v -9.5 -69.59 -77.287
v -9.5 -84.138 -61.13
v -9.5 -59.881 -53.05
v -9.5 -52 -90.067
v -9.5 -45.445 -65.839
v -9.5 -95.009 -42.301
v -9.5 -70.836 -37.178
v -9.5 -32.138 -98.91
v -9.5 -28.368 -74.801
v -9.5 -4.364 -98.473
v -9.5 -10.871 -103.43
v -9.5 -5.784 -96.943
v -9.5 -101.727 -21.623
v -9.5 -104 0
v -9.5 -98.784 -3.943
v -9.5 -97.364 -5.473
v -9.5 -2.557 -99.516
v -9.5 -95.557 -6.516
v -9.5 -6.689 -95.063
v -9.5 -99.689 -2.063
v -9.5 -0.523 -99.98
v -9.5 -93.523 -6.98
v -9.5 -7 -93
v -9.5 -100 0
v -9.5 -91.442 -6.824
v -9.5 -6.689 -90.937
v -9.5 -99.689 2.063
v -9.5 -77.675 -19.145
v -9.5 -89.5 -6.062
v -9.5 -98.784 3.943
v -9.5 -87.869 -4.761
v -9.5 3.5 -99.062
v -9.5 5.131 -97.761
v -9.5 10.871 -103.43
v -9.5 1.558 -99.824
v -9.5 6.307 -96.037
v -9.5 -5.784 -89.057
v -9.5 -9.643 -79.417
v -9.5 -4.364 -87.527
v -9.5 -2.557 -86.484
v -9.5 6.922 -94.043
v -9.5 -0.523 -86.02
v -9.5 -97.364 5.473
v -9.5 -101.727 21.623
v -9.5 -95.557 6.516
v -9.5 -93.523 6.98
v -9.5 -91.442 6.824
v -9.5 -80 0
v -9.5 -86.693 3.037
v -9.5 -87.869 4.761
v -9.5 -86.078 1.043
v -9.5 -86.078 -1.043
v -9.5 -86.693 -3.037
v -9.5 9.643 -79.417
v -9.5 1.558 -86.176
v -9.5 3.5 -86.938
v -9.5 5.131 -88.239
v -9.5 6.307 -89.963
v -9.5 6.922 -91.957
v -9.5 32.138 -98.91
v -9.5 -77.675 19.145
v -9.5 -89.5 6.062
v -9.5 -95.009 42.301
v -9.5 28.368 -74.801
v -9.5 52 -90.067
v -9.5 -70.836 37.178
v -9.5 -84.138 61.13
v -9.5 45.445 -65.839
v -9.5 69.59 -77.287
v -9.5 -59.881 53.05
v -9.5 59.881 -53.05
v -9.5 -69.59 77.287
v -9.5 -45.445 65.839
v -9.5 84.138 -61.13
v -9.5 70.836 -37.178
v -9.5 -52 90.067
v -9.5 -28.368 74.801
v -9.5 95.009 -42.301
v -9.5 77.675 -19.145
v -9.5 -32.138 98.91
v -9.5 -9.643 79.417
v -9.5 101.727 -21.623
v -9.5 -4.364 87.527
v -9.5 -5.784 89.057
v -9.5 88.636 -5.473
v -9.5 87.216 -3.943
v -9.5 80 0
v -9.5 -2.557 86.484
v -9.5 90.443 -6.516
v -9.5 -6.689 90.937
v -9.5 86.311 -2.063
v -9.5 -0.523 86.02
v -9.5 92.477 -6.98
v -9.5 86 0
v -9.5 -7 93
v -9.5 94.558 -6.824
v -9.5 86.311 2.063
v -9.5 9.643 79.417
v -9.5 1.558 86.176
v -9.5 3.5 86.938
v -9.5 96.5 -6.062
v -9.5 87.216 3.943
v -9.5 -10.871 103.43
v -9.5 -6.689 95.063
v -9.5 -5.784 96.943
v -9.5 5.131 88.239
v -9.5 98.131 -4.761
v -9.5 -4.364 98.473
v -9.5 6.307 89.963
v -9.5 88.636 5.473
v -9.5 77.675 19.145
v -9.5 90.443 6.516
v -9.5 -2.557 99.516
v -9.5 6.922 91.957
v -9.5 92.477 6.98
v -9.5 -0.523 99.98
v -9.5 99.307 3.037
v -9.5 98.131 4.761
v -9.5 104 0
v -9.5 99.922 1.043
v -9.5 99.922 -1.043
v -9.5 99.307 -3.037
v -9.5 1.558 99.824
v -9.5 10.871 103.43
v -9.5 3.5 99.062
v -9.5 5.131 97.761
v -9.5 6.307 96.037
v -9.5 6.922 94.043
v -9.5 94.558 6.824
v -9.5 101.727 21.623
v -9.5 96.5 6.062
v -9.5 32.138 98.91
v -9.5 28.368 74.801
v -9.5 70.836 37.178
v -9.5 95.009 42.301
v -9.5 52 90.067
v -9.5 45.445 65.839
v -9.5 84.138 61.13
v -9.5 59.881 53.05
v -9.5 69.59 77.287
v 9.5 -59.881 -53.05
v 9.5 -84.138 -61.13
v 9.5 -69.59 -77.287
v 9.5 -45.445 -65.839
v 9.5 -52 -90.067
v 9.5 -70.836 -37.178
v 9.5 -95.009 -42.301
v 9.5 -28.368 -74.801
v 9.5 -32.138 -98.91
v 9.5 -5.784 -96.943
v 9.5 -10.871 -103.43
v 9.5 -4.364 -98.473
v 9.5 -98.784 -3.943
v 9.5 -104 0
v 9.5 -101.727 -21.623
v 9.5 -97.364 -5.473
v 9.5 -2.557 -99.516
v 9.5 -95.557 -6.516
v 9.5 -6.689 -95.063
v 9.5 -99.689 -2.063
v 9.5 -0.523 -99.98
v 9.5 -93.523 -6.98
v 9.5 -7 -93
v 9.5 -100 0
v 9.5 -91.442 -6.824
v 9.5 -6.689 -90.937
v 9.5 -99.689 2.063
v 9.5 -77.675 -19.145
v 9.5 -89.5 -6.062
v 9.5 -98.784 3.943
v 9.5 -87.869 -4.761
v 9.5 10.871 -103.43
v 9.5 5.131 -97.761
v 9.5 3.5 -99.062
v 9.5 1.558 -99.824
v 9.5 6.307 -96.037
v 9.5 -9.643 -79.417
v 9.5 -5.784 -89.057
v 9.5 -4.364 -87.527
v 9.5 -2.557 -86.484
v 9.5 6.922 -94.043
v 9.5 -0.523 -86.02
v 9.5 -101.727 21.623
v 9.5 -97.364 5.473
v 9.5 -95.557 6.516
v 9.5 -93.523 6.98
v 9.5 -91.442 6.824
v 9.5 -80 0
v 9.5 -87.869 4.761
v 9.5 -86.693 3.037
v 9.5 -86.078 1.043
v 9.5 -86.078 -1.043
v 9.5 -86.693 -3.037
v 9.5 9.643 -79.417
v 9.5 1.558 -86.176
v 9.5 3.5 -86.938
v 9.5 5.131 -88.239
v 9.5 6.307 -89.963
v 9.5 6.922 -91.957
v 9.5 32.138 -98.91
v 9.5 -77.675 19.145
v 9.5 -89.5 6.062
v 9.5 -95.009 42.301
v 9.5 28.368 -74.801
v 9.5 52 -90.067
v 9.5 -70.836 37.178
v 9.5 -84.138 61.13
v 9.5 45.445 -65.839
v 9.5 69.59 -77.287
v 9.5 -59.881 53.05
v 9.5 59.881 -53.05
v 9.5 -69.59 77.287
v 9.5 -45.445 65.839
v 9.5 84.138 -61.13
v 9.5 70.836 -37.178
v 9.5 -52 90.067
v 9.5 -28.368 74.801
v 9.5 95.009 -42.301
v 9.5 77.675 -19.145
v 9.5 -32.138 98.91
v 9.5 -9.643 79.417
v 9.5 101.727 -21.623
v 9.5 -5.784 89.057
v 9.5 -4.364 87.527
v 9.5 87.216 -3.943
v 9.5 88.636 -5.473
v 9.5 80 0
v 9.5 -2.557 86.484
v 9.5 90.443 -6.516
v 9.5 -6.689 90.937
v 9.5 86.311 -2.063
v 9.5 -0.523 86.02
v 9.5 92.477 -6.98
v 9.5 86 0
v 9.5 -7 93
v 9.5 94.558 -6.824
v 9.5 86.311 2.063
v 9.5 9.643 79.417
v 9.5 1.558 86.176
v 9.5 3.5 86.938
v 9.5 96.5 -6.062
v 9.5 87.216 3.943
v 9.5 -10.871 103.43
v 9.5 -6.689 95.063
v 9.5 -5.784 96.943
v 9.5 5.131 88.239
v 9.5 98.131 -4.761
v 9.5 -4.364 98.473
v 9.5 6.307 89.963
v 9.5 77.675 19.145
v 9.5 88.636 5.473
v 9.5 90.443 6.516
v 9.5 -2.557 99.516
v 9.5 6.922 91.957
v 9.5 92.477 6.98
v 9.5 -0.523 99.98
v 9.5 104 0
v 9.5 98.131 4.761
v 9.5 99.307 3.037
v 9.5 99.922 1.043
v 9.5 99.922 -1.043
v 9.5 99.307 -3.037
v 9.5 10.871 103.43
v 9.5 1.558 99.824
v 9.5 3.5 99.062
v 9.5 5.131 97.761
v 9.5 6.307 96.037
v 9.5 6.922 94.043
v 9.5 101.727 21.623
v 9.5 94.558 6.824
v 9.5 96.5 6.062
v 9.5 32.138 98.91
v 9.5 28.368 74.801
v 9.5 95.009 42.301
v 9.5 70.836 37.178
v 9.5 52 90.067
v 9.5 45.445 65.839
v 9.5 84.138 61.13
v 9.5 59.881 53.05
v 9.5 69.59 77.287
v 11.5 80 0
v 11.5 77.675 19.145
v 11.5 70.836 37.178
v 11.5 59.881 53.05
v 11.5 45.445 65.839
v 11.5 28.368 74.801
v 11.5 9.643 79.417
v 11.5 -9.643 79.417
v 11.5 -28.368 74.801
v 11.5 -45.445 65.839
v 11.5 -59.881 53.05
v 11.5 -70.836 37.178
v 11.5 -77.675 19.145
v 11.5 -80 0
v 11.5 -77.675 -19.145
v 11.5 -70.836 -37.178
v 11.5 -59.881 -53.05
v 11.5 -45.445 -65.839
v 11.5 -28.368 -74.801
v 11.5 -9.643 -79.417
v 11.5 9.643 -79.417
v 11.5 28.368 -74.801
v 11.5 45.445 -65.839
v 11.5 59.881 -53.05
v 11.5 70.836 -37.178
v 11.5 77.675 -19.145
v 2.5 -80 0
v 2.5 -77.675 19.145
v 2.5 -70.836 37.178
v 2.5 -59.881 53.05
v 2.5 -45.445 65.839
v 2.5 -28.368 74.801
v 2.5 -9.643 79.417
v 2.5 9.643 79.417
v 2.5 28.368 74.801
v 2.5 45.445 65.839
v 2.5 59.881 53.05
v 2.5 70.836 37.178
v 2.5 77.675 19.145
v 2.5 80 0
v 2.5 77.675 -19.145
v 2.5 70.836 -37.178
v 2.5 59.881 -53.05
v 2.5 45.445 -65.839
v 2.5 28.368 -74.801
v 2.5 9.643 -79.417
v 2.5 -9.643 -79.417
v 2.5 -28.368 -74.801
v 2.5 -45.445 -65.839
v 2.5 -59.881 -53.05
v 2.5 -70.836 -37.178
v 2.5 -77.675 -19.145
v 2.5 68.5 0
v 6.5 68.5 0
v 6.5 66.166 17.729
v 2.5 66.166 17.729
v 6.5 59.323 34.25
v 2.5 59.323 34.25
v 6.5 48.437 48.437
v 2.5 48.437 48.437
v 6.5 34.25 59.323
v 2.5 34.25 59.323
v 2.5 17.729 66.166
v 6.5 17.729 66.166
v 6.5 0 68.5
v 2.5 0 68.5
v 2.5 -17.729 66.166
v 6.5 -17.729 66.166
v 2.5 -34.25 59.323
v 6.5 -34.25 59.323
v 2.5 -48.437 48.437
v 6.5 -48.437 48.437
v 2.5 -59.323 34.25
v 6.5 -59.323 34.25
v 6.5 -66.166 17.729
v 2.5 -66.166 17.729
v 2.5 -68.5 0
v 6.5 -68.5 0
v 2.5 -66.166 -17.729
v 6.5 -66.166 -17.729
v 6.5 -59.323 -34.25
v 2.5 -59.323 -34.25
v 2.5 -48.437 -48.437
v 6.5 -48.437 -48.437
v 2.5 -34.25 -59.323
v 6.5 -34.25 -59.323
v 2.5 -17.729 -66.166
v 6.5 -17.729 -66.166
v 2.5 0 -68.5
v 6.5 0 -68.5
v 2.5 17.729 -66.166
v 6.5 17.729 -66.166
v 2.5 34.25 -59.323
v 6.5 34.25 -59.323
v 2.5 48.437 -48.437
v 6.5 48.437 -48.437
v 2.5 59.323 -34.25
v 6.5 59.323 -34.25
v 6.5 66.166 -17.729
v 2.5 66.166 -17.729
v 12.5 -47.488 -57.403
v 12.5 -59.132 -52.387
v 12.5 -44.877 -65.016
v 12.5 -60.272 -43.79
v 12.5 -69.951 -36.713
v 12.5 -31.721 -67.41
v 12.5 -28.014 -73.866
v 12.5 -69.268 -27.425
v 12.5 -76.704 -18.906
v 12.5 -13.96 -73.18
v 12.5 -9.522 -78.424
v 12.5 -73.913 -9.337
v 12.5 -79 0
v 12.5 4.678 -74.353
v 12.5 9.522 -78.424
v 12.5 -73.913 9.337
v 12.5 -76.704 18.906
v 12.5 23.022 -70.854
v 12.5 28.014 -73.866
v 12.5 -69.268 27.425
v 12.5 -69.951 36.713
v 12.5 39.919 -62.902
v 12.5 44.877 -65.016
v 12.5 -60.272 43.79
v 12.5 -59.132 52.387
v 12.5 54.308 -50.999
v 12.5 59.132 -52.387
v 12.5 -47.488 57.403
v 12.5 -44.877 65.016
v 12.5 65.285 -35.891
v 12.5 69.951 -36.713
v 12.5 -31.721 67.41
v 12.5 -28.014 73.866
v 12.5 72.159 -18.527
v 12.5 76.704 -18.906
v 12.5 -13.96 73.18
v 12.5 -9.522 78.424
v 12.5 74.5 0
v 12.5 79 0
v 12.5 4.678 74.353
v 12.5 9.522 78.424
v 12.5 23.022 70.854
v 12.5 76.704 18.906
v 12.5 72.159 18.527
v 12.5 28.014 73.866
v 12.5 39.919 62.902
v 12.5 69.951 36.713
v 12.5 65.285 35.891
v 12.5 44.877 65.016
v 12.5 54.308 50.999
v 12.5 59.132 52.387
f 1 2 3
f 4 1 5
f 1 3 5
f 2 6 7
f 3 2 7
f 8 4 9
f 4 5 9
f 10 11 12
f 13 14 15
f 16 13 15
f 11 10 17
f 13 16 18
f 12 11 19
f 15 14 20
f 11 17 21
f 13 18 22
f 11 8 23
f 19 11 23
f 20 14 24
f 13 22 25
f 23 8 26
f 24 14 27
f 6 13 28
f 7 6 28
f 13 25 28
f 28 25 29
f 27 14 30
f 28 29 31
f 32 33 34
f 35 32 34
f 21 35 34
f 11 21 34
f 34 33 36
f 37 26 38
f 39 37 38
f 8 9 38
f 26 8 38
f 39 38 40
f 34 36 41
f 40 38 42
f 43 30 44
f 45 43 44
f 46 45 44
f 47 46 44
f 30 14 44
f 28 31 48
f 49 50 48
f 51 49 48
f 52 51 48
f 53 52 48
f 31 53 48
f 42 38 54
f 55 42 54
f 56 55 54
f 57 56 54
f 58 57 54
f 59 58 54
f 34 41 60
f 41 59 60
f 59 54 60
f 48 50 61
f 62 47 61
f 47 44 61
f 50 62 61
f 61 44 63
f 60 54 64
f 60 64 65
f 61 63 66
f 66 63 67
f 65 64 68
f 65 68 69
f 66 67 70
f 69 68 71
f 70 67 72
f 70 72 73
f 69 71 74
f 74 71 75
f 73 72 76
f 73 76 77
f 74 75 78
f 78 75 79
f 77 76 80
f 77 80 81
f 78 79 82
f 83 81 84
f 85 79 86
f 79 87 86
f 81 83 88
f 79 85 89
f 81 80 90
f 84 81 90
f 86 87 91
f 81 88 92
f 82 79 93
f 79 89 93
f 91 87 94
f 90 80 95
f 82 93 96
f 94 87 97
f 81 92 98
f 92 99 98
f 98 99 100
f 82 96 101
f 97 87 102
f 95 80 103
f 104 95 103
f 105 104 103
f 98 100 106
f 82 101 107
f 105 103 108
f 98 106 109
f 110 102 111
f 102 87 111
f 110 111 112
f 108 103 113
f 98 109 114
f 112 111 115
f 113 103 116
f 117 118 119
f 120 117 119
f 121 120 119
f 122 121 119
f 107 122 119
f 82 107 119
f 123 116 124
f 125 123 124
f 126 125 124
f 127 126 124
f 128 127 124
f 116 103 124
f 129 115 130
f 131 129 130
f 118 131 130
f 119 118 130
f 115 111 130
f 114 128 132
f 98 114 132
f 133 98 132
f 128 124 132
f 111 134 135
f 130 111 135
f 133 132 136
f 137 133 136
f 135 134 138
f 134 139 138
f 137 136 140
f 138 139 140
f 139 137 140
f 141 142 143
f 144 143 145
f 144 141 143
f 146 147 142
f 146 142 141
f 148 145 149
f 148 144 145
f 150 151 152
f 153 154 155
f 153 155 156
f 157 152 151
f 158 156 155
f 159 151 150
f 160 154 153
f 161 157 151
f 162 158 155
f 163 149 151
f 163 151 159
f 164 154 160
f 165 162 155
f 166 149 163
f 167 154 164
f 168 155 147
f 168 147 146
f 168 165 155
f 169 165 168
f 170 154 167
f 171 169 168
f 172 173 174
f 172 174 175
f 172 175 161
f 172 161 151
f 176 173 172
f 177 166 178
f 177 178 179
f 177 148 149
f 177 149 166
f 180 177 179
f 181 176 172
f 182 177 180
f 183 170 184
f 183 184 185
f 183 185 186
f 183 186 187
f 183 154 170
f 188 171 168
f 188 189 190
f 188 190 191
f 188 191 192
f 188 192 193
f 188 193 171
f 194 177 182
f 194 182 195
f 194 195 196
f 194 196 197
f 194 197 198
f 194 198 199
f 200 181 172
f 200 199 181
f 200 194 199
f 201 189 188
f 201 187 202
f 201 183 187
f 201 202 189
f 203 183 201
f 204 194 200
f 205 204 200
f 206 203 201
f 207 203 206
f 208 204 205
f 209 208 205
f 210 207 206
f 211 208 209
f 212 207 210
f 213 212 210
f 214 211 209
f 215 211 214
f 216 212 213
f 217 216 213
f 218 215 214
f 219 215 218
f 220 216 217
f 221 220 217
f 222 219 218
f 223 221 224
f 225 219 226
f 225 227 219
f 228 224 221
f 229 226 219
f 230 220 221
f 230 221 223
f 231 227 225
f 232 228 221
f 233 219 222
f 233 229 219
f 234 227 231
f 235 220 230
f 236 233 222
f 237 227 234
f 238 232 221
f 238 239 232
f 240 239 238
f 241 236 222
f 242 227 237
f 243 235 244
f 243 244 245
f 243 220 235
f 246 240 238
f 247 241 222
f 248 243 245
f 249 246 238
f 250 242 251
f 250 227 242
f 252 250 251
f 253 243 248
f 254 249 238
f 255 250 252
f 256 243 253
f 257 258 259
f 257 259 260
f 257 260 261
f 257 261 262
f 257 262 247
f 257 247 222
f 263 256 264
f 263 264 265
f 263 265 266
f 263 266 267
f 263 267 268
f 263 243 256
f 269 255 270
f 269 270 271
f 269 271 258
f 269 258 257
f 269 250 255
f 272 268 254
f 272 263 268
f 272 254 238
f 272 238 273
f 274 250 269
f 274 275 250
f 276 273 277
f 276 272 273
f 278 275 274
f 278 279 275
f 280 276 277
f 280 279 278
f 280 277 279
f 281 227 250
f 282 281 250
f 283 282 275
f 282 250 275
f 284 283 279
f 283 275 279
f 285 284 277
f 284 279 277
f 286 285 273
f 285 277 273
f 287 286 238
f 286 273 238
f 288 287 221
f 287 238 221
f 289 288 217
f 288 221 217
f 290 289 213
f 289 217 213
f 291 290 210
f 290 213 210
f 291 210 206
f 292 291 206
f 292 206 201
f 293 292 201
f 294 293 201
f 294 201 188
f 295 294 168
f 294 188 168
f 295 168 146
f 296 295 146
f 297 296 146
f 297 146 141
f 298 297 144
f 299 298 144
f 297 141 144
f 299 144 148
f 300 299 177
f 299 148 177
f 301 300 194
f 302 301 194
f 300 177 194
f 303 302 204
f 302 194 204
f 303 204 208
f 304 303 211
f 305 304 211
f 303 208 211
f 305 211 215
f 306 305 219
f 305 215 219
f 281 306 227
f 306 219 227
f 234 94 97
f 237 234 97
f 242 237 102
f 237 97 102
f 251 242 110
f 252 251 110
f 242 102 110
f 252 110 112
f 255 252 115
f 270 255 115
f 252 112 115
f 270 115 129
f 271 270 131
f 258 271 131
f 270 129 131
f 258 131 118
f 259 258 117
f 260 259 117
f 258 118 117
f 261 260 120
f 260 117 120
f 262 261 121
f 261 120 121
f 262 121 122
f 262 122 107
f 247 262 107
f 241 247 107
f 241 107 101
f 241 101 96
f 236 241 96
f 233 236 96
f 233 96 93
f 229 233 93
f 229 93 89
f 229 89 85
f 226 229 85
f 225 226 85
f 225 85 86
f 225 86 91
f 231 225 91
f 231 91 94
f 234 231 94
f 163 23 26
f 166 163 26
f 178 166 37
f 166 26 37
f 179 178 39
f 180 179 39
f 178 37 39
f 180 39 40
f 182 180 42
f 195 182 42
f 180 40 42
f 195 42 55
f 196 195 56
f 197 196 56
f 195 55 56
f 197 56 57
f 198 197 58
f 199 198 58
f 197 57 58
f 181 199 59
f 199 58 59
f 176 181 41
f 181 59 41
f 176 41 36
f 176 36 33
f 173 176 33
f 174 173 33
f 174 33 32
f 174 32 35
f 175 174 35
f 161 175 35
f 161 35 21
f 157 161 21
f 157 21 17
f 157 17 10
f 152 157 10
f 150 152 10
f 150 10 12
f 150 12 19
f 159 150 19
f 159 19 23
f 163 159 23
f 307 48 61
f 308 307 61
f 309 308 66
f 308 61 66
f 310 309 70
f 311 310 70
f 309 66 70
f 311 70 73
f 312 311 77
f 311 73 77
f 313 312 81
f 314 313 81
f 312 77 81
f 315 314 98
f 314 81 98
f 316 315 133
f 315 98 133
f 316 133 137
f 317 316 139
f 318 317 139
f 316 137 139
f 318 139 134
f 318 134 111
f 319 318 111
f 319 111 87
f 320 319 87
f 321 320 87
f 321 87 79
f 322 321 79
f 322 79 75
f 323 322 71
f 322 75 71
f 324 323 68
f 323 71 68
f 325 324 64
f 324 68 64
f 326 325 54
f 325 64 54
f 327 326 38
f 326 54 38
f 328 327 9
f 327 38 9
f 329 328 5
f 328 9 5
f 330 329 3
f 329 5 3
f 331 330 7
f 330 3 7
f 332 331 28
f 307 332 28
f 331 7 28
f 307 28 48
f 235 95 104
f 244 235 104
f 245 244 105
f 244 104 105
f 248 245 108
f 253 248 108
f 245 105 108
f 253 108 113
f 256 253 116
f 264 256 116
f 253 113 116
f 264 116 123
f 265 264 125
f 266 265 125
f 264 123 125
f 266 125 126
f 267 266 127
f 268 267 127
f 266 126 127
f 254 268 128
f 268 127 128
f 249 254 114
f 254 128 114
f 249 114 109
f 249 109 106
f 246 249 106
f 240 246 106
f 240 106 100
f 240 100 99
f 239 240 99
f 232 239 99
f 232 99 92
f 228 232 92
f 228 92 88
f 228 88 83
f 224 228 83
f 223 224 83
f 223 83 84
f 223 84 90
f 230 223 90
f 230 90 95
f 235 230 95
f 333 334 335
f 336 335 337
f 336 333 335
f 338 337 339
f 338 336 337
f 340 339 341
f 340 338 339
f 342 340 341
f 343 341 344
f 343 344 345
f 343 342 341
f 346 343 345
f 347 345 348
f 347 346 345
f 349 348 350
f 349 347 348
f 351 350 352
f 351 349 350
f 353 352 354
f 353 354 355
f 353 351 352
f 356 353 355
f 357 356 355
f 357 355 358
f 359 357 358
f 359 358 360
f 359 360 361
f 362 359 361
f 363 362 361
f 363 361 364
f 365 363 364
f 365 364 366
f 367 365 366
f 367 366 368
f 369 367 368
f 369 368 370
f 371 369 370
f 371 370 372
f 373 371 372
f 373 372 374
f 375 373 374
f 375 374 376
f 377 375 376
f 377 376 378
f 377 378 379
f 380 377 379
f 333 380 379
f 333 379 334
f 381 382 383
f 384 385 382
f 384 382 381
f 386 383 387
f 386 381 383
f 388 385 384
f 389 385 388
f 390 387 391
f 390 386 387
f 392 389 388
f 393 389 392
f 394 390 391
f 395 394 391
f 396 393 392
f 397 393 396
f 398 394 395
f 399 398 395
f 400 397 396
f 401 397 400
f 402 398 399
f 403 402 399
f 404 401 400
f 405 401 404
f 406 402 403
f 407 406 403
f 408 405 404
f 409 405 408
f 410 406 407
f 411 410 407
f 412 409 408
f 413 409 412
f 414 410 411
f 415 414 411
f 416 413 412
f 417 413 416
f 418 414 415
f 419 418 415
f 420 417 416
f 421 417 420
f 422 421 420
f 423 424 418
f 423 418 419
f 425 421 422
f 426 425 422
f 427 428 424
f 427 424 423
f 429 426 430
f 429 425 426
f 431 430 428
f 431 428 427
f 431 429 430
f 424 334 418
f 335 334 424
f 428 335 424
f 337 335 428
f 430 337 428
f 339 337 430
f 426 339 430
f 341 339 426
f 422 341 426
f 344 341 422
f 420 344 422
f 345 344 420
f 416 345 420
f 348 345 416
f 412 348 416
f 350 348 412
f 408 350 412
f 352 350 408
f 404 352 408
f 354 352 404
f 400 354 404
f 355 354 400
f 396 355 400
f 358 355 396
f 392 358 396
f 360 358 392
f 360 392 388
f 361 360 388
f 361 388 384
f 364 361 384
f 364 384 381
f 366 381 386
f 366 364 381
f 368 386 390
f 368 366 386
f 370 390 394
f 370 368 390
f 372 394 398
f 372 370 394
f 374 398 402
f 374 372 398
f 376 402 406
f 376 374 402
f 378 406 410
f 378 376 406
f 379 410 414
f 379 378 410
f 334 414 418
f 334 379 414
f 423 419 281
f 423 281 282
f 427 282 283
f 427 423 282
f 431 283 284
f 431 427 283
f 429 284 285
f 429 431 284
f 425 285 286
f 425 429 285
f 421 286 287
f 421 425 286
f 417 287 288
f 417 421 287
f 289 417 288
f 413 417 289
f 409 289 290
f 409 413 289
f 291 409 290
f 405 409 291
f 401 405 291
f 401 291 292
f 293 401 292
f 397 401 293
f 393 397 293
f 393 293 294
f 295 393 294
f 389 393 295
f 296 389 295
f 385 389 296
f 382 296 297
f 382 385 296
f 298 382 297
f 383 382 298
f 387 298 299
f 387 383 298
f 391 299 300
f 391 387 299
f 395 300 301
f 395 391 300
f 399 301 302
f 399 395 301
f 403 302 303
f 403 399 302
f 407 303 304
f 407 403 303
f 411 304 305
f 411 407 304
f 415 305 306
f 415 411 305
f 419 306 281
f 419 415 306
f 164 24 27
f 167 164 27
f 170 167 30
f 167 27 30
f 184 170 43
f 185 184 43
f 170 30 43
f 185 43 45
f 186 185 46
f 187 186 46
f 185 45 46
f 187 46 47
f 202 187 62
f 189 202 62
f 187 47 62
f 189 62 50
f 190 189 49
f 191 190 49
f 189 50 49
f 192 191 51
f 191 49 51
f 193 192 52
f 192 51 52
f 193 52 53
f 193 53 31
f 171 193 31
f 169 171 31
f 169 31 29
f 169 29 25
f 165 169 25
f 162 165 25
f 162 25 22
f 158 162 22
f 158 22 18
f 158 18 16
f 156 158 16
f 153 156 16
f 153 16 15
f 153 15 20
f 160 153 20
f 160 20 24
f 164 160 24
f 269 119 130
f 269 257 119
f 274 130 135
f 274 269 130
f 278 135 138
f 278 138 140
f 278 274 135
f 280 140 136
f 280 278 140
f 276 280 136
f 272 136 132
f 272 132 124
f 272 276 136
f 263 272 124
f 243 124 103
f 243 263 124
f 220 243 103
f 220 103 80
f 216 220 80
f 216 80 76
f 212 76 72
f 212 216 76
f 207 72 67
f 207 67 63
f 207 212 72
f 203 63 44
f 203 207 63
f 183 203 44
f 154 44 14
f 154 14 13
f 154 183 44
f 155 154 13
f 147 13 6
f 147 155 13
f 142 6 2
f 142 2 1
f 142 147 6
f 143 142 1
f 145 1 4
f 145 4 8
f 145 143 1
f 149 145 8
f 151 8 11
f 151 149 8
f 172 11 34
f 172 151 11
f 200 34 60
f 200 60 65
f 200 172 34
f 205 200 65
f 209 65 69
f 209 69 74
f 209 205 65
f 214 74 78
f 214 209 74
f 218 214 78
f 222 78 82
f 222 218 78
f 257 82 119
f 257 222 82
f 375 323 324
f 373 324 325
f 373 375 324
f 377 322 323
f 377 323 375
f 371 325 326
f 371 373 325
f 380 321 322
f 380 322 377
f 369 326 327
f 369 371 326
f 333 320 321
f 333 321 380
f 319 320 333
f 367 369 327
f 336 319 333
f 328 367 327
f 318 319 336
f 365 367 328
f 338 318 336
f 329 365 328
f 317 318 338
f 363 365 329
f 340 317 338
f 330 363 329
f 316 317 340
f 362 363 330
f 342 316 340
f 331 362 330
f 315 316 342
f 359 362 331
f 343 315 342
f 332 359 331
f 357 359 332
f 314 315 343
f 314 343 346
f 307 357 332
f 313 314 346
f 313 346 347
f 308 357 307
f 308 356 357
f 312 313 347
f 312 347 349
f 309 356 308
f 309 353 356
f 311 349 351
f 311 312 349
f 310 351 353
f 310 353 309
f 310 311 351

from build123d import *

# Parameters (mm, degrees)
F0_R     = 104
F0_R_2   = 68.5
F1_DEPTH = 9.5
F3_D     = 14
F4_R     = 80
F5_DEPTH = 12
F6_R     = 80
F6_R_2   = 68.5
F7_DEPTH = 3
F8_SIZE  = 1
F9_SIZE  = 6


with BuildPart() as f1:
    # F0 (on Right) → F1 (new body, symmetric)
    with BuildSketch(Plane.YZ):
        Circle(F0_R)
        Circle(F0_R_2, mode=Mode.SUBTRACT)
    extrude(amount=F1_DEPTH, both=True)

    # F3 (through all)
    with Locations(Plane.YZ.offset(9.5)):
        with Locations((0, 93), (93, 0), (0, -93), (-93, 0)):
            Hole(F3_D / 2)

    # F4 (on face) → F5 (cut)
    with BuildSketch(Plane(origin=(-9.5, 0, 0), x_dir=(0, -1, 0), z_dir=(-1, 0, 0))):
        Circle(F4_R)
    extrude(amount=-F5_DEPTH, mode=Mode.SUBTRACT)

    # F6 (on face) → F7 (join)
    with BuildSketch(Plane.YZ.offset(9.5)):
        Circle(F6_R)
        Circle(F6_R_2, mode=Mode.SUBTRACT)
    extrude(amount=F7_DEPTH)

    # F8
    f8_edges = [f1.edges().sort_by_distance(p)[0] for p in [
        (12.5, -80, 0),
    ]]
    chamfer(f8_edges, length=F8_SIZE)

    # F9
    f9_edges = [f1.edges().sort_by_distance(p)[0] for p in [
        (12.5, -68.5, 0),
    ]]
    chamfer(f9_edges, length=F9_SIZE)


solid = f1.part
